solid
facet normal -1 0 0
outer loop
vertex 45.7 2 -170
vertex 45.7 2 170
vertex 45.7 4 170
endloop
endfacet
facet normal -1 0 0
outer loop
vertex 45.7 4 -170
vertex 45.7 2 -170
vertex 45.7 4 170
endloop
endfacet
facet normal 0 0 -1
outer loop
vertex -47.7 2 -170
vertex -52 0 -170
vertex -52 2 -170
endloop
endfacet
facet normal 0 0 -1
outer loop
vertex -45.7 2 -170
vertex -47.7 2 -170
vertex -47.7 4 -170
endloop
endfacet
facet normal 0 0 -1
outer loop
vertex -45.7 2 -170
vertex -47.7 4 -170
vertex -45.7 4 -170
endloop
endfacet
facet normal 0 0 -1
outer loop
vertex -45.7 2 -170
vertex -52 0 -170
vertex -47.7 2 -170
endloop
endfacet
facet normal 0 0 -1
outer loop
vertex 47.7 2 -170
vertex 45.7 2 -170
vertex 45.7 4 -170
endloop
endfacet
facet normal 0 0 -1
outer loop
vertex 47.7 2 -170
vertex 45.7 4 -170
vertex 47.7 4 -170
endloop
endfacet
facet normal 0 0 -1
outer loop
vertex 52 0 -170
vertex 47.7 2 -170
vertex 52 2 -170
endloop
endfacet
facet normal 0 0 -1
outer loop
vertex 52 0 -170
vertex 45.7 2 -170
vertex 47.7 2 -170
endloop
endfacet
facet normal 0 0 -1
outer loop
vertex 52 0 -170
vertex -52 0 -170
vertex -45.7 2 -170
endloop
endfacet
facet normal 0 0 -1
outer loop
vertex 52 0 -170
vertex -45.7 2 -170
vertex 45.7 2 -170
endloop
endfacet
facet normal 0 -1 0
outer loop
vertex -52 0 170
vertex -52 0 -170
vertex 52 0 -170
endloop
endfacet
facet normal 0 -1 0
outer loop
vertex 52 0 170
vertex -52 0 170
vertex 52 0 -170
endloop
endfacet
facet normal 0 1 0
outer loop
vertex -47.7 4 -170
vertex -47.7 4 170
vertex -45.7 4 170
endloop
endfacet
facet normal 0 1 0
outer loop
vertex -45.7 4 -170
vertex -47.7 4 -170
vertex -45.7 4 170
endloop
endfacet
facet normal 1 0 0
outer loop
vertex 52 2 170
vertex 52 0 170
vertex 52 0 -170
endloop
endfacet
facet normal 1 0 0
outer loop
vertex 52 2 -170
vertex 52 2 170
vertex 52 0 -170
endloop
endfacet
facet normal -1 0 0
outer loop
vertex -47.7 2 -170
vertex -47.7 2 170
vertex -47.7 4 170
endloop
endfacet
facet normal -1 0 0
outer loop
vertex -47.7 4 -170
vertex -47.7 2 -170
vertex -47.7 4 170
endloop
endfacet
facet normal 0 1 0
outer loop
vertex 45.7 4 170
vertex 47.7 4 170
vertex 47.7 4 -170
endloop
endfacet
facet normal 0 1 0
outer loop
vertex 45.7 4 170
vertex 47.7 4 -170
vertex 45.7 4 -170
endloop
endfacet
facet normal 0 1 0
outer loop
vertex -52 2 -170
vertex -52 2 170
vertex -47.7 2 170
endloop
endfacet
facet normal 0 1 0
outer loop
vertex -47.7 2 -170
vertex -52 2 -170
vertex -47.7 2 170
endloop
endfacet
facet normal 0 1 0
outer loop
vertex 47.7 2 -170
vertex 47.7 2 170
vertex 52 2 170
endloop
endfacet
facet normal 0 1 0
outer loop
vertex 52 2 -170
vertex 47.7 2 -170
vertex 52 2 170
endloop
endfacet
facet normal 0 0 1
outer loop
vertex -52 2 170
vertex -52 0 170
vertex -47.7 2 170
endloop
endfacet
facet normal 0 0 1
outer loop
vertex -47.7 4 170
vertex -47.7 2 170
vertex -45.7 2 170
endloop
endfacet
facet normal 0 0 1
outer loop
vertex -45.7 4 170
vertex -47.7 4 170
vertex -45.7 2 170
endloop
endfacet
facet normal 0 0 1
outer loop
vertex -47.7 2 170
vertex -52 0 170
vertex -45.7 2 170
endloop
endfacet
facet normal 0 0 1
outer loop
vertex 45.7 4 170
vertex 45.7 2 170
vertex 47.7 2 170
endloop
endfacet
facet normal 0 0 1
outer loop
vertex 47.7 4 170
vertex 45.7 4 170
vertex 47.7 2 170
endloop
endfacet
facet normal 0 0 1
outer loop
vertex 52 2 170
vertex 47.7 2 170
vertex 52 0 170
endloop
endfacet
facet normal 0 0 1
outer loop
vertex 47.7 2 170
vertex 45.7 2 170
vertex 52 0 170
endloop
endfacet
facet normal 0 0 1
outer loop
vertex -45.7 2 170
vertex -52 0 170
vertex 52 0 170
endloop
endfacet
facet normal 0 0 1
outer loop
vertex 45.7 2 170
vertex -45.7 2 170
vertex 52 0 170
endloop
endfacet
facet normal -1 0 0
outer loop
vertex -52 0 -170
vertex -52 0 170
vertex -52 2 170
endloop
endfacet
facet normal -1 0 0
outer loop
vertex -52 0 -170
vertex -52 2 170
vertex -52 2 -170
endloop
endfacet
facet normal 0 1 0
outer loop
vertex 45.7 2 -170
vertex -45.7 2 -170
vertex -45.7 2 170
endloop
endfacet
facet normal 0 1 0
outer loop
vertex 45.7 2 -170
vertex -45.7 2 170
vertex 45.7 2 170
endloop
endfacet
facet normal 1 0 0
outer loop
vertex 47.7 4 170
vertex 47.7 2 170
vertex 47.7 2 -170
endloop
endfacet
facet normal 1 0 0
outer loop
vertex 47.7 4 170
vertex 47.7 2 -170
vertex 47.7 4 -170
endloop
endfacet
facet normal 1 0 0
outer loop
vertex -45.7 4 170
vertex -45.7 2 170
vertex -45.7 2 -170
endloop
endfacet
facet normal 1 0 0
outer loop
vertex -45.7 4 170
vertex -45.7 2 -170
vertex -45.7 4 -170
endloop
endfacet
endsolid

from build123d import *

# Parameters (mm, degrees)
SKETCH_1_W      = 104
SKETCH_1_H      = 340
EXTRUDE_1_DEPTH = 2
SKETCH_2_W      = 2
SKETCH_2_H      = 2
EXTRUDE_2_DEPTH = 340


with BuildPart() as part:
    # Эскиз1 → Бобышка-Вытянуть1 (new body)
    with BuildSketch(Plane(origin=(0, 0, 0), x_dir=(1, 0, 0), z_dir=(0, 1, 0))):
        Rectangle(SKETCH_1_W, SKETCH_1_H)
    extrude(amount=EXTRUDE_1_DEPTH)

    # Эскиз2 → Бобышка-Вытянуть2 (add)
    with BuildSketch(Plane.XY.offset(170)):
        with Locations((-46.7, 3)):
            Rectangle(SKETCH_2_W, SKETCH_2_H)
    extrude_2 = extrude(amount=-EXTRUDE_2_DEPTH)

    # Зеркальное отражение1: Бобышка-Вытянуть2 across plane
    add(extrude_2.mirror(Plane(origin=(0, 0, 0), x_dir=(0, 0, 1), z_dir=(1, 0, 0))))


solid = part.part
